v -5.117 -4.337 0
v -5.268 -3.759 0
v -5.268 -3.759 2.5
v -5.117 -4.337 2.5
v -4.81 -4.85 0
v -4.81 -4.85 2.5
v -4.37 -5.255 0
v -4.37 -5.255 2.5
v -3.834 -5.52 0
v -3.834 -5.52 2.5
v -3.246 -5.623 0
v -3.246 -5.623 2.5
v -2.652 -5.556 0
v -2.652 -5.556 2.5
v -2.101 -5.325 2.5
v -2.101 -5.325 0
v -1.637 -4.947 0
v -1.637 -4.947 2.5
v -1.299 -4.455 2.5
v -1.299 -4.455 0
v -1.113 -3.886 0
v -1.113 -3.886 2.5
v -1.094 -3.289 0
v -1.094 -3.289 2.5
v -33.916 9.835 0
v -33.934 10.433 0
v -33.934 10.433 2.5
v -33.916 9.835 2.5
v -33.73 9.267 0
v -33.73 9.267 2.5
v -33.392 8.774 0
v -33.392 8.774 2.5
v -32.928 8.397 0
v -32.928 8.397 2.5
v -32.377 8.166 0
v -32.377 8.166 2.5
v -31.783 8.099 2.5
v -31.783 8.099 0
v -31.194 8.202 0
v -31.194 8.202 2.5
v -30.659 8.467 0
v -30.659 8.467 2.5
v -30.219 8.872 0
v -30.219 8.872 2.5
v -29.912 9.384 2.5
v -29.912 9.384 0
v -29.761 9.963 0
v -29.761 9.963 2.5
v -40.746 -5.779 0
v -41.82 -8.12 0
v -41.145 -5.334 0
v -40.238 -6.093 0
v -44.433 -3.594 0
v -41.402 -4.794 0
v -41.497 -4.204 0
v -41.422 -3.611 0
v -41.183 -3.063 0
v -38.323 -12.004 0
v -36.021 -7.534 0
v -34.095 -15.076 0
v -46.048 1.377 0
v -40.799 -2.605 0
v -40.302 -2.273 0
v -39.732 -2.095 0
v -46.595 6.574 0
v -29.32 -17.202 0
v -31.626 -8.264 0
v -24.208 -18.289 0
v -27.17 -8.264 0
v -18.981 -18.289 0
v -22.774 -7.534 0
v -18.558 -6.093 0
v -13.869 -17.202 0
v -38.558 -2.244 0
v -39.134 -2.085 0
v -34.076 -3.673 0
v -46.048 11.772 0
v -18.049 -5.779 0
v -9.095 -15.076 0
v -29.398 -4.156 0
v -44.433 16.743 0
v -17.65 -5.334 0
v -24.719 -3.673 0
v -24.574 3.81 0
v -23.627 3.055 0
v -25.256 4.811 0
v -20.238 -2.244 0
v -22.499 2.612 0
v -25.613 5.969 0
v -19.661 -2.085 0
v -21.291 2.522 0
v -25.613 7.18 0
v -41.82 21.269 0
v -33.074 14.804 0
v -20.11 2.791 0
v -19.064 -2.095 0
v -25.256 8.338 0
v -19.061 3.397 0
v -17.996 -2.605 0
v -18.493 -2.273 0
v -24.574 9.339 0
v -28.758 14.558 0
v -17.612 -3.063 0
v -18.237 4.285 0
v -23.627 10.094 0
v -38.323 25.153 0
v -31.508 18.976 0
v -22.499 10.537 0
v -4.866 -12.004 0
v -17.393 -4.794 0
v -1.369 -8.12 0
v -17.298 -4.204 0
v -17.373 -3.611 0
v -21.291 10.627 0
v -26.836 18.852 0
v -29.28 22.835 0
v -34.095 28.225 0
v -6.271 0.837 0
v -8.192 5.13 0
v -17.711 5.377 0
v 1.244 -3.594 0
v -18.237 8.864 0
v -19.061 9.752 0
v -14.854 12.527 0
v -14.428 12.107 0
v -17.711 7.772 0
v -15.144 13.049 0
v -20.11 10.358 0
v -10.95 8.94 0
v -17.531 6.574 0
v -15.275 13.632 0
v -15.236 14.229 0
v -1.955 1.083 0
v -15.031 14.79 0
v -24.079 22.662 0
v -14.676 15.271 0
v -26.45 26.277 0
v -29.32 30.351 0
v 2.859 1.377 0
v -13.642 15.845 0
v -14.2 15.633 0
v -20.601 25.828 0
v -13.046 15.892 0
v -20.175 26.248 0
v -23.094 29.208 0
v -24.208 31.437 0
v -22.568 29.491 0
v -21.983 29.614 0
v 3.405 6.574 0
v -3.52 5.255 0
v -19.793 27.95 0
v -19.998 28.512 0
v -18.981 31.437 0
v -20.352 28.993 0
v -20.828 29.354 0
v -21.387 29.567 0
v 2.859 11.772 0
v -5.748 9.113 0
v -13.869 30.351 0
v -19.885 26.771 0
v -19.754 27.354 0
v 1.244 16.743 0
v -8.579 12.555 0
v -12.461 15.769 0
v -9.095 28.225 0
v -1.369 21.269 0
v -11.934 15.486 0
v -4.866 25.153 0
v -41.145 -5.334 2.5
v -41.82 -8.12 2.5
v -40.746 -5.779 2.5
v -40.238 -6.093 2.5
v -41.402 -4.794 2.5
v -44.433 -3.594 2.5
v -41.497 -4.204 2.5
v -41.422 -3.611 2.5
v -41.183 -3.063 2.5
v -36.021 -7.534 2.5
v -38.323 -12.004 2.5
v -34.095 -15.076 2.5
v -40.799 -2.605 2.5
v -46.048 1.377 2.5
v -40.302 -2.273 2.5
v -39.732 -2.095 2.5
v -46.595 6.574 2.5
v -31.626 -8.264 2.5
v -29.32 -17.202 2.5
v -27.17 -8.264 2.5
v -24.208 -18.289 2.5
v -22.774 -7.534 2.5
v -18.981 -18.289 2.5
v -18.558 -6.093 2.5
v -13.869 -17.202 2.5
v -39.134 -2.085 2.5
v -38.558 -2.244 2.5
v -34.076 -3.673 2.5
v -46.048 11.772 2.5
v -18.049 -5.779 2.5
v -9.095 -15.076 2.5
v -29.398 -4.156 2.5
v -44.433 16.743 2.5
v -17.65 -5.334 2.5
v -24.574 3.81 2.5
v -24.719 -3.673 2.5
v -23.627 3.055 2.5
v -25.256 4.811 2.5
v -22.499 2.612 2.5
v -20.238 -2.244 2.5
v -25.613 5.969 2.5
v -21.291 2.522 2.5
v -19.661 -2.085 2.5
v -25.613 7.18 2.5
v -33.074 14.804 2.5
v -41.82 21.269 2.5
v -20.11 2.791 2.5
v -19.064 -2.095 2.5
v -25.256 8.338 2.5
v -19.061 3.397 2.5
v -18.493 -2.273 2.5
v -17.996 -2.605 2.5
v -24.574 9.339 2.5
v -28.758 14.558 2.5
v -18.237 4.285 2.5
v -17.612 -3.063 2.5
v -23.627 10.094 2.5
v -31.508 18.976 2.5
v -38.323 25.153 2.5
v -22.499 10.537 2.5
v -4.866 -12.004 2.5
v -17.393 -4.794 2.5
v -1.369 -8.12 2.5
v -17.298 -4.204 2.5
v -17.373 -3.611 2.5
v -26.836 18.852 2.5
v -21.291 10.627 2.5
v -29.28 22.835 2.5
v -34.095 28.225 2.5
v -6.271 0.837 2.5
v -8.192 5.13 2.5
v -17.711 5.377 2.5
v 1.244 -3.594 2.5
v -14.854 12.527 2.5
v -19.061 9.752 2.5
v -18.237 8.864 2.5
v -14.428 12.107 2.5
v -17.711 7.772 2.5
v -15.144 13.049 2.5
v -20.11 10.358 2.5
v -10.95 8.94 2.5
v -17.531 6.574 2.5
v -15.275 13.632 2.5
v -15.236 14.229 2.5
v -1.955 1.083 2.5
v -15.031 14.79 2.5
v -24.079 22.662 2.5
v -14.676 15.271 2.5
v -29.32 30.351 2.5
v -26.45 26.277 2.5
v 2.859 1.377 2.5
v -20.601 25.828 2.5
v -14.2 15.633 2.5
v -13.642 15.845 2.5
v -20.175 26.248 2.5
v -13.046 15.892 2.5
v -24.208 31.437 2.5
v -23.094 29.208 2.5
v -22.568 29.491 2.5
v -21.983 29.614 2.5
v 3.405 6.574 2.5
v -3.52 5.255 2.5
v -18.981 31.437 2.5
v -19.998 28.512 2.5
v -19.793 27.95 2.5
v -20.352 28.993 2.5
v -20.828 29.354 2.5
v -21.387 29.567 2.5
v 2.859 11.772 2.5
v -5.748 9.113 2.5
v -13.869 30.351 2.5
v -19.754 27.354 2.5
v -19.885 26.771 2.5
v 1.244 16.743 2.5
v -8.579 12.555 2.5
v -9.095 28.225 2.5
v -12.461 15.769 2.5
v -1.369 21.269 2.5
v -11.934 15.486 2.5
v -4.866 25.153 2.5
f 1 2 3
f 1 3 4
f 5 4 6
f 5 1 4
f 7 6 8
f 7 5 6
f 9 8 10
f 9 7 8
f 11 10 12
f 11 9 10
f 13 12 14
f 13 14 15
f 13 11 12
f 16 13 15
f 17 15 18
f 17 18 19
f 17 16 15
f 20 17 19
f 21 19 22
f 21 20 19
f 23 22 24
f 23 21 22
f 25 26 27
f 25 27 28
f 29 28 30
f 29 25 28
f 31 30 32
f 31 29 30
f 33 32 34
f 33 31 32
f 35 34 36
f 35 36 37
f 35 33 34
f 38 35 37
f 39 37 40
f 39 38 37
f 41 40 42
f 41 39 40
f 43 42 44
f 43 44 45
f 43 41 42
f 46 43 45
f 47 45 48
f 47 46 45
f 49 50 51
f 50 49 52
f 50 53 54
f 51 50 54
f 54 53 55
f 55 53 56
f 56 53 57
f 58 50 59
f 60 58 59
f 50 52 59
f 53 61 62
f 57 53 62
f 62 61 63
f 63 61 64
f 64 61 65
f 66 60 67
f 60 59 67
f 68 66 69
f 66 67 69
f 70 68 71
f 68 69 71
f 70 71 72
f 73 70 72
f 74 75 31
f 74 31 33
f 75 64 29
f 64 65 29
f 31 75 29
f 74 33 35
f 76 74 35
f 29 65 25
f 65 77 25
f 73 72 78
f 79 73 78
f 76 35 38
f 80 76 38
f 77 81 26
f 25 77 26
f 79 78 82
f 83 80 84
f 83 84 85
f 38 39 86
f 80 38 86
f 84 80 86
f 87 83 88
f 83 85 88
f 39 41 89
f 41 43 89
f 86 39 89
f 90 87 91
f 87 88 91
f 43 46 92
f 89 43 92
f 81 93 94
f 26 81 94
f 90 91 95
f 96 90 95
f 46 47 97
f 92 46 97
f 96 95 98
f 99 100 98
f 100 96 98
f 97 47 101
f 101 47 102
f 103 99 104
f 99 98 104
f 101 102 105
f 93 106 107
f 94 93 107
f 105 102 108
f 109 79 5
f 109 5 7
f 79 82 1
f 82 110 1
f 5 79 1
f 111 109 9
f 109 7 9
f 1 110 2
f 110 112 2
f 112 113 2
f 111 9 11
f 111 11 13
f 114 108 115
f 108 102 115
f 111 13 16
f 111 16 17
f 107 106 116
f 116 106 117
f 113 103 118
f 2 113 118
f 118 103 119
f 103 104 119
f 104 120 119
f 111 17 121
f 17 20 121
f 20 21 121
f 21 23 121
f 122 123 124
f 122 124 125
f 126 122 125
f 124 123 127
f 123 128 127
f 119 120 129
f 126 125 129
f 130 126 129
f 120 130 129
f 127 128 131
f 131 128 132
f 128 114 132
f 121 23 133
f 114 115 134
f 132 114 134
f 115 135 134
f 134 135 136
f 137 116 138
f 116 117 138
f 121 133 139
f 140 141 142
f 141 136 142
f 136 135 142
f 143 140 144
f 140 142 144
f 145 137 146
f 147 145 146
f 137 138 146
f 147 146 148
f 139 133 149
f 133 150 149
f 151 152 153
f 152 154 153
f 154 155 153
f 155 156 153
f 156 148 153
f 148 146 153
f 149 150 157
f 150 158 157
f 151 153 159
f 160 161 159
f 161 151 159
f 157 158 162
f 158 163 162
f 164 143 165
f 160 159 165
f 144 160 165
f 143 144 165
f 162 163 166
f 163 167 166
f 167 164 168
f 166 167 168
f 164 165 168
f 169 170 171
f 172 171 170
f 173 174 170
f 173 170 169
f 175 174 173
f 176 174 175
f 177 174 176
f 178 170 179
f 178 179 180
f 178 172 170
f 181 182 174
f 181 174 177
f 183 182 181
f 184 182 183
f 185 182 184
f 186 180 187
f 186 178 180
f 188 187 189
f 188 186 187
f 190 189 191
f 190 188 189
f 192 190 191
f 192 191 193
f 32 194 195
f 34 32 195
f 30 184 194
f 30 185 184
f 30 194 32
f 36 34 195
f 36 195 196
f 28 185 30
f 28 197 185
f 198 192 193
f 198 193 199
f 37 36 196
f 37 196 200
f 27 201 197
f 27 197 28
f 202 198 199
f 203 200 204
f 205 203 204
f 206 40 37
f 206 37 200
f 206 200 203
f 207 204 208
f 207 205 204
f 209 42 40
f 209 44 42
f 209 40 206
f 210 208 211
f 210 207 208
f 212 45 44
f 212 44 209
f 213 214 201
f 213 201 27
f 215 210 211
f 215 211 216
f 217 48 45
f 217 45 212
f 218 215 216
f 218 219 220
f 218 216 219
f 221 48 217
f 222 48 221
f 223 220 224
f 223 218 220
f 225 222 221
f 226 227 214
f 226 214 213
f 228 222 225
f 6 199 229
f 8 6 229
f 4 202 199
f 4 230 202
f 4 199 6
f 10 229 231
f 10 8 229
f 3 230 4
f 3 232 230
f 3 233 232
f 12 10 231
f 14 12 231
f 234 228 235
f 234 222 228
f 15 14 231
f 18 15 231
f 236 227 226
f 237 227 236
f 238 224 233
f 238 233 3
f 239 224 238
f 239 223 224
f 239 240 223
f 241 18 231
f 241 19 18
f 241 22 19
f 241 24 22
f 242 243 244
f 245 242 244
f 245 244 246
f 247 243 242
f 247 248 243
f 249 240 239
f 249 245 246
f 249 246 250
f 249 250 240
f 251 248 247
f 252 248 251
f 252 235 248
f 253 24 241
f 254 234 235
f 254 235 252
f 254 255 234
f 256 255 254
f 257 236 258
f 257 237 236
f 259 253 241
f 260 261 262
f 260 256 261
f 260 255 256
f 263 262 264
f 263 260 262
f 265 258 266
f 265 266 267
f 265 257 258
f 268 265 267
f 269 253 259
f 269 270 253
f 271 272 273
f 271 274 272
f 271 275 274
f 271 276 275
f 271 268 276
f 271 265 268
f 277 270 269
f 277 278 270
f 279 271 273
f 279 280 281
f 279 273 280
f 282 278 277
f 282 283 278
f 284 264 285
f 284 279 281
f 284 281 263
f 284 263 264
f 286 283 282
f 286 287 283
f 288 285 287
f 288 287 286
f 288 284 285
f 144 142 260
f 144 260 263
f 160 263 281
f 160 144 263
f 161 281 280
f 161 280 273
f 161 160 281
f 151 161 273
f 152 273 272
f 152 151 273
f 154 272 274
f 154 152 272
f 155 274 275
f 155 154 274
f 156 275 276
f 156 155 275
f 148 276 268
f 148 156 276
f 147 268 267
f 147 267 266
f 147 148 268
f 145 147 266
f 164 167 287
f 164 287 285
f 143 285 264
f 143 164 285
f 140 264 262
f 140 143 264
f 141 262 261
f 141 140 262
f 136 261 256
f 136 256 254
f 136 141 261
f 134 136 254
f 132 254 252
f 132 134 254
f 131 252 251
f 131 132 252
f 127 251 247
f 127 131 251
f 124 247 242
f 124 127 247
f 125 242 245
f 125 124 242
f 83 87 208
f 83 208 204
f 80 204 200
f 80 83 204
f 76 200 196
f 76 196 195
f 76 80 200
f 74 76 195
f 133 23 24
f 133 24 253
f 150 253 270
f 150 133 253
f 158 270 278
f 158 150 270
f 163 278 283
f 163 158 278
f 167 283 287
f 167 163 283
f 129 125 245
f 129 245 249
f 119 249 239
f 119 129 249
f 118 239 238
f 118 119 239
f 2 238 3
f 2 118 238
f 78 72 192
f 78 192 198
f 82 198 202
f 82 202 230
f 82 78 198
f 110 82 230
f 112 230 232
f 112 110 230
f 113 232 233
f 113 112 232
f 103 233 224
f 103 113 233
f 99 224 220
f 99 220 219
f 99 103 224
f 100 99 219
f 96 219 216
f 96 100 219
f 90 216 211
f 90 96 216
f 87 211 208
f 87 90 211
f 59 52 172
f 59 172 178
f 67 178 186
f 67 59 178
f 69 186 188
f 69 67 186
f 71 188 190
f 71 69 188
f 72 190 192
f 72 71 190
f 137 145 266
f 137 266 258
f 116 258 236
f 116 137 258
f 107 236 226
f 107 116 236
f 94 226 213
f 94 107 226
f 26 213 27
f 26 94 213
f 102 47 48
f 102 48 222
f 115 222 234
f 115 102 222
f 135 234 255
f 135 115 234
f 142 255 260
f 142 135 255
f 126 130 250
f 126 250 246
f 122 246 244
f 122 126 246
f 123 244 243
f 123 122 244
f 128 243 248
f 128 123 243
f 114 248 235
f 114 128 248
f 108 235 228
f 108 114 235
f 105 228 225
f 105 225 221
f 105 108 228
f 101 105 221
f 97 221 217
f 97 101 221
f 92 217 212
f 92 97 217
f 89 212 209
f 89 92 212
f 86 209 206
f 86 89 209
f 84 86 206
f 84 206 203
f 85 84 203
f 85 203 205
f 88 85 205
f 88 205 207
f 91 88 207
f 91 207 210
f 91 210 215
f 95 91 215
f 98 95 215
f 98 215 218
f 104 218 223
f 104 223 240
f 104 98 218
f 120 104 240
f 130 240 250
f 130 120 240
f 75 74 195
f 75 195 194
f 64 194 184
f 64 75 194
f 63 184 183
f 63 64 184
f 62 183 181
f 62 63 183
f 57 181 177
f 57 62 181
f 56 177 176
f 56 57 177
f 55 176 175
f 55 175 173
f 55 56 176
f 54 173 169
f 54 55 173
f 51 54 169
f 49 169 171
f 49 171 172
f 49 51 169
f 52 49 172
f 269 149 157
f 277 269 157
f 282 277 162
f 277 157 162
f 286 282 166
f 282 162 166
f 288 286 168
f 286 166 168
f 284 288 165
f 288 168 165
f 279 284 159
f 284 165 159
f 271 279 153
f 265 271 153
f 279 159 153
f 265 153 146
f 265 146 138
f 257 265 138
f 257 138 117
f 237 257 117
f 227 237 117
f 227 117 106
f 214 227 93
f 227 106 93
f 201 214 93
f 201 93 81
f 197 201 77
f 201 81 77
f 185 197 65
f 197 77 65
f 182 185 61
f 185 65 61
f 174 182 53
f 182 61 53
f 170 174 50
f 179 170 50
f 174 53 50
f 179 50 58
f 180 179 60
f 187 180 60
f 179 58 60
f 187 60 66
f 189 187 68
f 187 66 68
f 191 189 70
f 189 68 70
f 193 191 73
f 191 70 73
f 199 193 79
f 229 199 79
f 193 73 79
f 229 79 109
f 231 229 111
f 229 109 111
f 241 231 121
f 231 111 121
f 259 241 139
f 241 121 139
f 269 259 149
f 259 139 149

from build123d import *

# Parameters (mm, degrees)
SKETCH1_R           = 25
SKETCH1_R_2         = 4.064
BOSS_EXTRUDE1_DEPTH = 2.5


with BuildPart() as part:
    # Sketch1 → Boss-Extrude1 (new body)
    with BuildSketch(Plane.XY):
        with Locations((-21.594590832, 6.574444403)):
            Circle(SKETCH1_R)
        with Locations((-21.594590832, 6.574444403)):
            Circle(SKETCH1_R_2, mode=Mode.SUBTRACT)
        with BuildLine():
            ThreePointArc((-1.094322082, -3.289024862), (-4.554991799, 7.229910381), (-11.934322082, 15.486405892))
            ThreePointArc((-11.934322082, 15.486405892), (-14.870947643, 15.043426983), (-14.427968734, 12.106801422))
            ThreePointArc((-14.427968734, 12.106801422), (-8.192298494, 5.129910381), (-5.267968734, -3.758783976))
            ThreePointArc((-5.267968734, -3.758783976), (-2.946265851, -5.610727745), (-1.094322082, -3.289024862))
        make_face(mode=Mode.SUBTRACT)
        with BuildLine():
            ThreePointArc((-40.23766089, -6.093180307), (-29.39766089, -8.35562004), (-18.55766089, -6.093180307))
            ThreePointArc((-18.55766089, -6.093180307), (-17.472979098, -3.328498515), (-20.23766089, -2.243816723))
            ThreePointArc((-20.23766089, -2.243816723), (-29.39766089, -4.15562004), (-38.55766089, -2.243816723))
            ThreePointArc((-38.55766089, -2.243816723), (-41.322342681, -3.328498515), (-40.23766089, -6.093180307))
        make_face(mode=Mode.SUBTRACT)
        with BuildLine():
            ThreePointArc((-33.934461337, 10.432592457), (-32.082517568, 8.110889575), (-29.760814685, 9.962833344))
            ThreePointArc((-29.760814685, 9.962833344), (-26.836484925, 18.851527701), (-20.600814685, 25.828418741))
            ThreePointArc((-20.600814685, 25.828418741), (-20.157835776, 28.765044302), (-23.094461337, 29.208023212))
            ThreePointArc((-23.094461337, 29.208023212), (-30.473791621, 20.951527701), (-33.934461337, 10.432592457))
        make_face(mode=Mode.SUBTRACT)
    extrude(amount=BOSS_EXTRUDE1_DEPTH)


solid = part.part
